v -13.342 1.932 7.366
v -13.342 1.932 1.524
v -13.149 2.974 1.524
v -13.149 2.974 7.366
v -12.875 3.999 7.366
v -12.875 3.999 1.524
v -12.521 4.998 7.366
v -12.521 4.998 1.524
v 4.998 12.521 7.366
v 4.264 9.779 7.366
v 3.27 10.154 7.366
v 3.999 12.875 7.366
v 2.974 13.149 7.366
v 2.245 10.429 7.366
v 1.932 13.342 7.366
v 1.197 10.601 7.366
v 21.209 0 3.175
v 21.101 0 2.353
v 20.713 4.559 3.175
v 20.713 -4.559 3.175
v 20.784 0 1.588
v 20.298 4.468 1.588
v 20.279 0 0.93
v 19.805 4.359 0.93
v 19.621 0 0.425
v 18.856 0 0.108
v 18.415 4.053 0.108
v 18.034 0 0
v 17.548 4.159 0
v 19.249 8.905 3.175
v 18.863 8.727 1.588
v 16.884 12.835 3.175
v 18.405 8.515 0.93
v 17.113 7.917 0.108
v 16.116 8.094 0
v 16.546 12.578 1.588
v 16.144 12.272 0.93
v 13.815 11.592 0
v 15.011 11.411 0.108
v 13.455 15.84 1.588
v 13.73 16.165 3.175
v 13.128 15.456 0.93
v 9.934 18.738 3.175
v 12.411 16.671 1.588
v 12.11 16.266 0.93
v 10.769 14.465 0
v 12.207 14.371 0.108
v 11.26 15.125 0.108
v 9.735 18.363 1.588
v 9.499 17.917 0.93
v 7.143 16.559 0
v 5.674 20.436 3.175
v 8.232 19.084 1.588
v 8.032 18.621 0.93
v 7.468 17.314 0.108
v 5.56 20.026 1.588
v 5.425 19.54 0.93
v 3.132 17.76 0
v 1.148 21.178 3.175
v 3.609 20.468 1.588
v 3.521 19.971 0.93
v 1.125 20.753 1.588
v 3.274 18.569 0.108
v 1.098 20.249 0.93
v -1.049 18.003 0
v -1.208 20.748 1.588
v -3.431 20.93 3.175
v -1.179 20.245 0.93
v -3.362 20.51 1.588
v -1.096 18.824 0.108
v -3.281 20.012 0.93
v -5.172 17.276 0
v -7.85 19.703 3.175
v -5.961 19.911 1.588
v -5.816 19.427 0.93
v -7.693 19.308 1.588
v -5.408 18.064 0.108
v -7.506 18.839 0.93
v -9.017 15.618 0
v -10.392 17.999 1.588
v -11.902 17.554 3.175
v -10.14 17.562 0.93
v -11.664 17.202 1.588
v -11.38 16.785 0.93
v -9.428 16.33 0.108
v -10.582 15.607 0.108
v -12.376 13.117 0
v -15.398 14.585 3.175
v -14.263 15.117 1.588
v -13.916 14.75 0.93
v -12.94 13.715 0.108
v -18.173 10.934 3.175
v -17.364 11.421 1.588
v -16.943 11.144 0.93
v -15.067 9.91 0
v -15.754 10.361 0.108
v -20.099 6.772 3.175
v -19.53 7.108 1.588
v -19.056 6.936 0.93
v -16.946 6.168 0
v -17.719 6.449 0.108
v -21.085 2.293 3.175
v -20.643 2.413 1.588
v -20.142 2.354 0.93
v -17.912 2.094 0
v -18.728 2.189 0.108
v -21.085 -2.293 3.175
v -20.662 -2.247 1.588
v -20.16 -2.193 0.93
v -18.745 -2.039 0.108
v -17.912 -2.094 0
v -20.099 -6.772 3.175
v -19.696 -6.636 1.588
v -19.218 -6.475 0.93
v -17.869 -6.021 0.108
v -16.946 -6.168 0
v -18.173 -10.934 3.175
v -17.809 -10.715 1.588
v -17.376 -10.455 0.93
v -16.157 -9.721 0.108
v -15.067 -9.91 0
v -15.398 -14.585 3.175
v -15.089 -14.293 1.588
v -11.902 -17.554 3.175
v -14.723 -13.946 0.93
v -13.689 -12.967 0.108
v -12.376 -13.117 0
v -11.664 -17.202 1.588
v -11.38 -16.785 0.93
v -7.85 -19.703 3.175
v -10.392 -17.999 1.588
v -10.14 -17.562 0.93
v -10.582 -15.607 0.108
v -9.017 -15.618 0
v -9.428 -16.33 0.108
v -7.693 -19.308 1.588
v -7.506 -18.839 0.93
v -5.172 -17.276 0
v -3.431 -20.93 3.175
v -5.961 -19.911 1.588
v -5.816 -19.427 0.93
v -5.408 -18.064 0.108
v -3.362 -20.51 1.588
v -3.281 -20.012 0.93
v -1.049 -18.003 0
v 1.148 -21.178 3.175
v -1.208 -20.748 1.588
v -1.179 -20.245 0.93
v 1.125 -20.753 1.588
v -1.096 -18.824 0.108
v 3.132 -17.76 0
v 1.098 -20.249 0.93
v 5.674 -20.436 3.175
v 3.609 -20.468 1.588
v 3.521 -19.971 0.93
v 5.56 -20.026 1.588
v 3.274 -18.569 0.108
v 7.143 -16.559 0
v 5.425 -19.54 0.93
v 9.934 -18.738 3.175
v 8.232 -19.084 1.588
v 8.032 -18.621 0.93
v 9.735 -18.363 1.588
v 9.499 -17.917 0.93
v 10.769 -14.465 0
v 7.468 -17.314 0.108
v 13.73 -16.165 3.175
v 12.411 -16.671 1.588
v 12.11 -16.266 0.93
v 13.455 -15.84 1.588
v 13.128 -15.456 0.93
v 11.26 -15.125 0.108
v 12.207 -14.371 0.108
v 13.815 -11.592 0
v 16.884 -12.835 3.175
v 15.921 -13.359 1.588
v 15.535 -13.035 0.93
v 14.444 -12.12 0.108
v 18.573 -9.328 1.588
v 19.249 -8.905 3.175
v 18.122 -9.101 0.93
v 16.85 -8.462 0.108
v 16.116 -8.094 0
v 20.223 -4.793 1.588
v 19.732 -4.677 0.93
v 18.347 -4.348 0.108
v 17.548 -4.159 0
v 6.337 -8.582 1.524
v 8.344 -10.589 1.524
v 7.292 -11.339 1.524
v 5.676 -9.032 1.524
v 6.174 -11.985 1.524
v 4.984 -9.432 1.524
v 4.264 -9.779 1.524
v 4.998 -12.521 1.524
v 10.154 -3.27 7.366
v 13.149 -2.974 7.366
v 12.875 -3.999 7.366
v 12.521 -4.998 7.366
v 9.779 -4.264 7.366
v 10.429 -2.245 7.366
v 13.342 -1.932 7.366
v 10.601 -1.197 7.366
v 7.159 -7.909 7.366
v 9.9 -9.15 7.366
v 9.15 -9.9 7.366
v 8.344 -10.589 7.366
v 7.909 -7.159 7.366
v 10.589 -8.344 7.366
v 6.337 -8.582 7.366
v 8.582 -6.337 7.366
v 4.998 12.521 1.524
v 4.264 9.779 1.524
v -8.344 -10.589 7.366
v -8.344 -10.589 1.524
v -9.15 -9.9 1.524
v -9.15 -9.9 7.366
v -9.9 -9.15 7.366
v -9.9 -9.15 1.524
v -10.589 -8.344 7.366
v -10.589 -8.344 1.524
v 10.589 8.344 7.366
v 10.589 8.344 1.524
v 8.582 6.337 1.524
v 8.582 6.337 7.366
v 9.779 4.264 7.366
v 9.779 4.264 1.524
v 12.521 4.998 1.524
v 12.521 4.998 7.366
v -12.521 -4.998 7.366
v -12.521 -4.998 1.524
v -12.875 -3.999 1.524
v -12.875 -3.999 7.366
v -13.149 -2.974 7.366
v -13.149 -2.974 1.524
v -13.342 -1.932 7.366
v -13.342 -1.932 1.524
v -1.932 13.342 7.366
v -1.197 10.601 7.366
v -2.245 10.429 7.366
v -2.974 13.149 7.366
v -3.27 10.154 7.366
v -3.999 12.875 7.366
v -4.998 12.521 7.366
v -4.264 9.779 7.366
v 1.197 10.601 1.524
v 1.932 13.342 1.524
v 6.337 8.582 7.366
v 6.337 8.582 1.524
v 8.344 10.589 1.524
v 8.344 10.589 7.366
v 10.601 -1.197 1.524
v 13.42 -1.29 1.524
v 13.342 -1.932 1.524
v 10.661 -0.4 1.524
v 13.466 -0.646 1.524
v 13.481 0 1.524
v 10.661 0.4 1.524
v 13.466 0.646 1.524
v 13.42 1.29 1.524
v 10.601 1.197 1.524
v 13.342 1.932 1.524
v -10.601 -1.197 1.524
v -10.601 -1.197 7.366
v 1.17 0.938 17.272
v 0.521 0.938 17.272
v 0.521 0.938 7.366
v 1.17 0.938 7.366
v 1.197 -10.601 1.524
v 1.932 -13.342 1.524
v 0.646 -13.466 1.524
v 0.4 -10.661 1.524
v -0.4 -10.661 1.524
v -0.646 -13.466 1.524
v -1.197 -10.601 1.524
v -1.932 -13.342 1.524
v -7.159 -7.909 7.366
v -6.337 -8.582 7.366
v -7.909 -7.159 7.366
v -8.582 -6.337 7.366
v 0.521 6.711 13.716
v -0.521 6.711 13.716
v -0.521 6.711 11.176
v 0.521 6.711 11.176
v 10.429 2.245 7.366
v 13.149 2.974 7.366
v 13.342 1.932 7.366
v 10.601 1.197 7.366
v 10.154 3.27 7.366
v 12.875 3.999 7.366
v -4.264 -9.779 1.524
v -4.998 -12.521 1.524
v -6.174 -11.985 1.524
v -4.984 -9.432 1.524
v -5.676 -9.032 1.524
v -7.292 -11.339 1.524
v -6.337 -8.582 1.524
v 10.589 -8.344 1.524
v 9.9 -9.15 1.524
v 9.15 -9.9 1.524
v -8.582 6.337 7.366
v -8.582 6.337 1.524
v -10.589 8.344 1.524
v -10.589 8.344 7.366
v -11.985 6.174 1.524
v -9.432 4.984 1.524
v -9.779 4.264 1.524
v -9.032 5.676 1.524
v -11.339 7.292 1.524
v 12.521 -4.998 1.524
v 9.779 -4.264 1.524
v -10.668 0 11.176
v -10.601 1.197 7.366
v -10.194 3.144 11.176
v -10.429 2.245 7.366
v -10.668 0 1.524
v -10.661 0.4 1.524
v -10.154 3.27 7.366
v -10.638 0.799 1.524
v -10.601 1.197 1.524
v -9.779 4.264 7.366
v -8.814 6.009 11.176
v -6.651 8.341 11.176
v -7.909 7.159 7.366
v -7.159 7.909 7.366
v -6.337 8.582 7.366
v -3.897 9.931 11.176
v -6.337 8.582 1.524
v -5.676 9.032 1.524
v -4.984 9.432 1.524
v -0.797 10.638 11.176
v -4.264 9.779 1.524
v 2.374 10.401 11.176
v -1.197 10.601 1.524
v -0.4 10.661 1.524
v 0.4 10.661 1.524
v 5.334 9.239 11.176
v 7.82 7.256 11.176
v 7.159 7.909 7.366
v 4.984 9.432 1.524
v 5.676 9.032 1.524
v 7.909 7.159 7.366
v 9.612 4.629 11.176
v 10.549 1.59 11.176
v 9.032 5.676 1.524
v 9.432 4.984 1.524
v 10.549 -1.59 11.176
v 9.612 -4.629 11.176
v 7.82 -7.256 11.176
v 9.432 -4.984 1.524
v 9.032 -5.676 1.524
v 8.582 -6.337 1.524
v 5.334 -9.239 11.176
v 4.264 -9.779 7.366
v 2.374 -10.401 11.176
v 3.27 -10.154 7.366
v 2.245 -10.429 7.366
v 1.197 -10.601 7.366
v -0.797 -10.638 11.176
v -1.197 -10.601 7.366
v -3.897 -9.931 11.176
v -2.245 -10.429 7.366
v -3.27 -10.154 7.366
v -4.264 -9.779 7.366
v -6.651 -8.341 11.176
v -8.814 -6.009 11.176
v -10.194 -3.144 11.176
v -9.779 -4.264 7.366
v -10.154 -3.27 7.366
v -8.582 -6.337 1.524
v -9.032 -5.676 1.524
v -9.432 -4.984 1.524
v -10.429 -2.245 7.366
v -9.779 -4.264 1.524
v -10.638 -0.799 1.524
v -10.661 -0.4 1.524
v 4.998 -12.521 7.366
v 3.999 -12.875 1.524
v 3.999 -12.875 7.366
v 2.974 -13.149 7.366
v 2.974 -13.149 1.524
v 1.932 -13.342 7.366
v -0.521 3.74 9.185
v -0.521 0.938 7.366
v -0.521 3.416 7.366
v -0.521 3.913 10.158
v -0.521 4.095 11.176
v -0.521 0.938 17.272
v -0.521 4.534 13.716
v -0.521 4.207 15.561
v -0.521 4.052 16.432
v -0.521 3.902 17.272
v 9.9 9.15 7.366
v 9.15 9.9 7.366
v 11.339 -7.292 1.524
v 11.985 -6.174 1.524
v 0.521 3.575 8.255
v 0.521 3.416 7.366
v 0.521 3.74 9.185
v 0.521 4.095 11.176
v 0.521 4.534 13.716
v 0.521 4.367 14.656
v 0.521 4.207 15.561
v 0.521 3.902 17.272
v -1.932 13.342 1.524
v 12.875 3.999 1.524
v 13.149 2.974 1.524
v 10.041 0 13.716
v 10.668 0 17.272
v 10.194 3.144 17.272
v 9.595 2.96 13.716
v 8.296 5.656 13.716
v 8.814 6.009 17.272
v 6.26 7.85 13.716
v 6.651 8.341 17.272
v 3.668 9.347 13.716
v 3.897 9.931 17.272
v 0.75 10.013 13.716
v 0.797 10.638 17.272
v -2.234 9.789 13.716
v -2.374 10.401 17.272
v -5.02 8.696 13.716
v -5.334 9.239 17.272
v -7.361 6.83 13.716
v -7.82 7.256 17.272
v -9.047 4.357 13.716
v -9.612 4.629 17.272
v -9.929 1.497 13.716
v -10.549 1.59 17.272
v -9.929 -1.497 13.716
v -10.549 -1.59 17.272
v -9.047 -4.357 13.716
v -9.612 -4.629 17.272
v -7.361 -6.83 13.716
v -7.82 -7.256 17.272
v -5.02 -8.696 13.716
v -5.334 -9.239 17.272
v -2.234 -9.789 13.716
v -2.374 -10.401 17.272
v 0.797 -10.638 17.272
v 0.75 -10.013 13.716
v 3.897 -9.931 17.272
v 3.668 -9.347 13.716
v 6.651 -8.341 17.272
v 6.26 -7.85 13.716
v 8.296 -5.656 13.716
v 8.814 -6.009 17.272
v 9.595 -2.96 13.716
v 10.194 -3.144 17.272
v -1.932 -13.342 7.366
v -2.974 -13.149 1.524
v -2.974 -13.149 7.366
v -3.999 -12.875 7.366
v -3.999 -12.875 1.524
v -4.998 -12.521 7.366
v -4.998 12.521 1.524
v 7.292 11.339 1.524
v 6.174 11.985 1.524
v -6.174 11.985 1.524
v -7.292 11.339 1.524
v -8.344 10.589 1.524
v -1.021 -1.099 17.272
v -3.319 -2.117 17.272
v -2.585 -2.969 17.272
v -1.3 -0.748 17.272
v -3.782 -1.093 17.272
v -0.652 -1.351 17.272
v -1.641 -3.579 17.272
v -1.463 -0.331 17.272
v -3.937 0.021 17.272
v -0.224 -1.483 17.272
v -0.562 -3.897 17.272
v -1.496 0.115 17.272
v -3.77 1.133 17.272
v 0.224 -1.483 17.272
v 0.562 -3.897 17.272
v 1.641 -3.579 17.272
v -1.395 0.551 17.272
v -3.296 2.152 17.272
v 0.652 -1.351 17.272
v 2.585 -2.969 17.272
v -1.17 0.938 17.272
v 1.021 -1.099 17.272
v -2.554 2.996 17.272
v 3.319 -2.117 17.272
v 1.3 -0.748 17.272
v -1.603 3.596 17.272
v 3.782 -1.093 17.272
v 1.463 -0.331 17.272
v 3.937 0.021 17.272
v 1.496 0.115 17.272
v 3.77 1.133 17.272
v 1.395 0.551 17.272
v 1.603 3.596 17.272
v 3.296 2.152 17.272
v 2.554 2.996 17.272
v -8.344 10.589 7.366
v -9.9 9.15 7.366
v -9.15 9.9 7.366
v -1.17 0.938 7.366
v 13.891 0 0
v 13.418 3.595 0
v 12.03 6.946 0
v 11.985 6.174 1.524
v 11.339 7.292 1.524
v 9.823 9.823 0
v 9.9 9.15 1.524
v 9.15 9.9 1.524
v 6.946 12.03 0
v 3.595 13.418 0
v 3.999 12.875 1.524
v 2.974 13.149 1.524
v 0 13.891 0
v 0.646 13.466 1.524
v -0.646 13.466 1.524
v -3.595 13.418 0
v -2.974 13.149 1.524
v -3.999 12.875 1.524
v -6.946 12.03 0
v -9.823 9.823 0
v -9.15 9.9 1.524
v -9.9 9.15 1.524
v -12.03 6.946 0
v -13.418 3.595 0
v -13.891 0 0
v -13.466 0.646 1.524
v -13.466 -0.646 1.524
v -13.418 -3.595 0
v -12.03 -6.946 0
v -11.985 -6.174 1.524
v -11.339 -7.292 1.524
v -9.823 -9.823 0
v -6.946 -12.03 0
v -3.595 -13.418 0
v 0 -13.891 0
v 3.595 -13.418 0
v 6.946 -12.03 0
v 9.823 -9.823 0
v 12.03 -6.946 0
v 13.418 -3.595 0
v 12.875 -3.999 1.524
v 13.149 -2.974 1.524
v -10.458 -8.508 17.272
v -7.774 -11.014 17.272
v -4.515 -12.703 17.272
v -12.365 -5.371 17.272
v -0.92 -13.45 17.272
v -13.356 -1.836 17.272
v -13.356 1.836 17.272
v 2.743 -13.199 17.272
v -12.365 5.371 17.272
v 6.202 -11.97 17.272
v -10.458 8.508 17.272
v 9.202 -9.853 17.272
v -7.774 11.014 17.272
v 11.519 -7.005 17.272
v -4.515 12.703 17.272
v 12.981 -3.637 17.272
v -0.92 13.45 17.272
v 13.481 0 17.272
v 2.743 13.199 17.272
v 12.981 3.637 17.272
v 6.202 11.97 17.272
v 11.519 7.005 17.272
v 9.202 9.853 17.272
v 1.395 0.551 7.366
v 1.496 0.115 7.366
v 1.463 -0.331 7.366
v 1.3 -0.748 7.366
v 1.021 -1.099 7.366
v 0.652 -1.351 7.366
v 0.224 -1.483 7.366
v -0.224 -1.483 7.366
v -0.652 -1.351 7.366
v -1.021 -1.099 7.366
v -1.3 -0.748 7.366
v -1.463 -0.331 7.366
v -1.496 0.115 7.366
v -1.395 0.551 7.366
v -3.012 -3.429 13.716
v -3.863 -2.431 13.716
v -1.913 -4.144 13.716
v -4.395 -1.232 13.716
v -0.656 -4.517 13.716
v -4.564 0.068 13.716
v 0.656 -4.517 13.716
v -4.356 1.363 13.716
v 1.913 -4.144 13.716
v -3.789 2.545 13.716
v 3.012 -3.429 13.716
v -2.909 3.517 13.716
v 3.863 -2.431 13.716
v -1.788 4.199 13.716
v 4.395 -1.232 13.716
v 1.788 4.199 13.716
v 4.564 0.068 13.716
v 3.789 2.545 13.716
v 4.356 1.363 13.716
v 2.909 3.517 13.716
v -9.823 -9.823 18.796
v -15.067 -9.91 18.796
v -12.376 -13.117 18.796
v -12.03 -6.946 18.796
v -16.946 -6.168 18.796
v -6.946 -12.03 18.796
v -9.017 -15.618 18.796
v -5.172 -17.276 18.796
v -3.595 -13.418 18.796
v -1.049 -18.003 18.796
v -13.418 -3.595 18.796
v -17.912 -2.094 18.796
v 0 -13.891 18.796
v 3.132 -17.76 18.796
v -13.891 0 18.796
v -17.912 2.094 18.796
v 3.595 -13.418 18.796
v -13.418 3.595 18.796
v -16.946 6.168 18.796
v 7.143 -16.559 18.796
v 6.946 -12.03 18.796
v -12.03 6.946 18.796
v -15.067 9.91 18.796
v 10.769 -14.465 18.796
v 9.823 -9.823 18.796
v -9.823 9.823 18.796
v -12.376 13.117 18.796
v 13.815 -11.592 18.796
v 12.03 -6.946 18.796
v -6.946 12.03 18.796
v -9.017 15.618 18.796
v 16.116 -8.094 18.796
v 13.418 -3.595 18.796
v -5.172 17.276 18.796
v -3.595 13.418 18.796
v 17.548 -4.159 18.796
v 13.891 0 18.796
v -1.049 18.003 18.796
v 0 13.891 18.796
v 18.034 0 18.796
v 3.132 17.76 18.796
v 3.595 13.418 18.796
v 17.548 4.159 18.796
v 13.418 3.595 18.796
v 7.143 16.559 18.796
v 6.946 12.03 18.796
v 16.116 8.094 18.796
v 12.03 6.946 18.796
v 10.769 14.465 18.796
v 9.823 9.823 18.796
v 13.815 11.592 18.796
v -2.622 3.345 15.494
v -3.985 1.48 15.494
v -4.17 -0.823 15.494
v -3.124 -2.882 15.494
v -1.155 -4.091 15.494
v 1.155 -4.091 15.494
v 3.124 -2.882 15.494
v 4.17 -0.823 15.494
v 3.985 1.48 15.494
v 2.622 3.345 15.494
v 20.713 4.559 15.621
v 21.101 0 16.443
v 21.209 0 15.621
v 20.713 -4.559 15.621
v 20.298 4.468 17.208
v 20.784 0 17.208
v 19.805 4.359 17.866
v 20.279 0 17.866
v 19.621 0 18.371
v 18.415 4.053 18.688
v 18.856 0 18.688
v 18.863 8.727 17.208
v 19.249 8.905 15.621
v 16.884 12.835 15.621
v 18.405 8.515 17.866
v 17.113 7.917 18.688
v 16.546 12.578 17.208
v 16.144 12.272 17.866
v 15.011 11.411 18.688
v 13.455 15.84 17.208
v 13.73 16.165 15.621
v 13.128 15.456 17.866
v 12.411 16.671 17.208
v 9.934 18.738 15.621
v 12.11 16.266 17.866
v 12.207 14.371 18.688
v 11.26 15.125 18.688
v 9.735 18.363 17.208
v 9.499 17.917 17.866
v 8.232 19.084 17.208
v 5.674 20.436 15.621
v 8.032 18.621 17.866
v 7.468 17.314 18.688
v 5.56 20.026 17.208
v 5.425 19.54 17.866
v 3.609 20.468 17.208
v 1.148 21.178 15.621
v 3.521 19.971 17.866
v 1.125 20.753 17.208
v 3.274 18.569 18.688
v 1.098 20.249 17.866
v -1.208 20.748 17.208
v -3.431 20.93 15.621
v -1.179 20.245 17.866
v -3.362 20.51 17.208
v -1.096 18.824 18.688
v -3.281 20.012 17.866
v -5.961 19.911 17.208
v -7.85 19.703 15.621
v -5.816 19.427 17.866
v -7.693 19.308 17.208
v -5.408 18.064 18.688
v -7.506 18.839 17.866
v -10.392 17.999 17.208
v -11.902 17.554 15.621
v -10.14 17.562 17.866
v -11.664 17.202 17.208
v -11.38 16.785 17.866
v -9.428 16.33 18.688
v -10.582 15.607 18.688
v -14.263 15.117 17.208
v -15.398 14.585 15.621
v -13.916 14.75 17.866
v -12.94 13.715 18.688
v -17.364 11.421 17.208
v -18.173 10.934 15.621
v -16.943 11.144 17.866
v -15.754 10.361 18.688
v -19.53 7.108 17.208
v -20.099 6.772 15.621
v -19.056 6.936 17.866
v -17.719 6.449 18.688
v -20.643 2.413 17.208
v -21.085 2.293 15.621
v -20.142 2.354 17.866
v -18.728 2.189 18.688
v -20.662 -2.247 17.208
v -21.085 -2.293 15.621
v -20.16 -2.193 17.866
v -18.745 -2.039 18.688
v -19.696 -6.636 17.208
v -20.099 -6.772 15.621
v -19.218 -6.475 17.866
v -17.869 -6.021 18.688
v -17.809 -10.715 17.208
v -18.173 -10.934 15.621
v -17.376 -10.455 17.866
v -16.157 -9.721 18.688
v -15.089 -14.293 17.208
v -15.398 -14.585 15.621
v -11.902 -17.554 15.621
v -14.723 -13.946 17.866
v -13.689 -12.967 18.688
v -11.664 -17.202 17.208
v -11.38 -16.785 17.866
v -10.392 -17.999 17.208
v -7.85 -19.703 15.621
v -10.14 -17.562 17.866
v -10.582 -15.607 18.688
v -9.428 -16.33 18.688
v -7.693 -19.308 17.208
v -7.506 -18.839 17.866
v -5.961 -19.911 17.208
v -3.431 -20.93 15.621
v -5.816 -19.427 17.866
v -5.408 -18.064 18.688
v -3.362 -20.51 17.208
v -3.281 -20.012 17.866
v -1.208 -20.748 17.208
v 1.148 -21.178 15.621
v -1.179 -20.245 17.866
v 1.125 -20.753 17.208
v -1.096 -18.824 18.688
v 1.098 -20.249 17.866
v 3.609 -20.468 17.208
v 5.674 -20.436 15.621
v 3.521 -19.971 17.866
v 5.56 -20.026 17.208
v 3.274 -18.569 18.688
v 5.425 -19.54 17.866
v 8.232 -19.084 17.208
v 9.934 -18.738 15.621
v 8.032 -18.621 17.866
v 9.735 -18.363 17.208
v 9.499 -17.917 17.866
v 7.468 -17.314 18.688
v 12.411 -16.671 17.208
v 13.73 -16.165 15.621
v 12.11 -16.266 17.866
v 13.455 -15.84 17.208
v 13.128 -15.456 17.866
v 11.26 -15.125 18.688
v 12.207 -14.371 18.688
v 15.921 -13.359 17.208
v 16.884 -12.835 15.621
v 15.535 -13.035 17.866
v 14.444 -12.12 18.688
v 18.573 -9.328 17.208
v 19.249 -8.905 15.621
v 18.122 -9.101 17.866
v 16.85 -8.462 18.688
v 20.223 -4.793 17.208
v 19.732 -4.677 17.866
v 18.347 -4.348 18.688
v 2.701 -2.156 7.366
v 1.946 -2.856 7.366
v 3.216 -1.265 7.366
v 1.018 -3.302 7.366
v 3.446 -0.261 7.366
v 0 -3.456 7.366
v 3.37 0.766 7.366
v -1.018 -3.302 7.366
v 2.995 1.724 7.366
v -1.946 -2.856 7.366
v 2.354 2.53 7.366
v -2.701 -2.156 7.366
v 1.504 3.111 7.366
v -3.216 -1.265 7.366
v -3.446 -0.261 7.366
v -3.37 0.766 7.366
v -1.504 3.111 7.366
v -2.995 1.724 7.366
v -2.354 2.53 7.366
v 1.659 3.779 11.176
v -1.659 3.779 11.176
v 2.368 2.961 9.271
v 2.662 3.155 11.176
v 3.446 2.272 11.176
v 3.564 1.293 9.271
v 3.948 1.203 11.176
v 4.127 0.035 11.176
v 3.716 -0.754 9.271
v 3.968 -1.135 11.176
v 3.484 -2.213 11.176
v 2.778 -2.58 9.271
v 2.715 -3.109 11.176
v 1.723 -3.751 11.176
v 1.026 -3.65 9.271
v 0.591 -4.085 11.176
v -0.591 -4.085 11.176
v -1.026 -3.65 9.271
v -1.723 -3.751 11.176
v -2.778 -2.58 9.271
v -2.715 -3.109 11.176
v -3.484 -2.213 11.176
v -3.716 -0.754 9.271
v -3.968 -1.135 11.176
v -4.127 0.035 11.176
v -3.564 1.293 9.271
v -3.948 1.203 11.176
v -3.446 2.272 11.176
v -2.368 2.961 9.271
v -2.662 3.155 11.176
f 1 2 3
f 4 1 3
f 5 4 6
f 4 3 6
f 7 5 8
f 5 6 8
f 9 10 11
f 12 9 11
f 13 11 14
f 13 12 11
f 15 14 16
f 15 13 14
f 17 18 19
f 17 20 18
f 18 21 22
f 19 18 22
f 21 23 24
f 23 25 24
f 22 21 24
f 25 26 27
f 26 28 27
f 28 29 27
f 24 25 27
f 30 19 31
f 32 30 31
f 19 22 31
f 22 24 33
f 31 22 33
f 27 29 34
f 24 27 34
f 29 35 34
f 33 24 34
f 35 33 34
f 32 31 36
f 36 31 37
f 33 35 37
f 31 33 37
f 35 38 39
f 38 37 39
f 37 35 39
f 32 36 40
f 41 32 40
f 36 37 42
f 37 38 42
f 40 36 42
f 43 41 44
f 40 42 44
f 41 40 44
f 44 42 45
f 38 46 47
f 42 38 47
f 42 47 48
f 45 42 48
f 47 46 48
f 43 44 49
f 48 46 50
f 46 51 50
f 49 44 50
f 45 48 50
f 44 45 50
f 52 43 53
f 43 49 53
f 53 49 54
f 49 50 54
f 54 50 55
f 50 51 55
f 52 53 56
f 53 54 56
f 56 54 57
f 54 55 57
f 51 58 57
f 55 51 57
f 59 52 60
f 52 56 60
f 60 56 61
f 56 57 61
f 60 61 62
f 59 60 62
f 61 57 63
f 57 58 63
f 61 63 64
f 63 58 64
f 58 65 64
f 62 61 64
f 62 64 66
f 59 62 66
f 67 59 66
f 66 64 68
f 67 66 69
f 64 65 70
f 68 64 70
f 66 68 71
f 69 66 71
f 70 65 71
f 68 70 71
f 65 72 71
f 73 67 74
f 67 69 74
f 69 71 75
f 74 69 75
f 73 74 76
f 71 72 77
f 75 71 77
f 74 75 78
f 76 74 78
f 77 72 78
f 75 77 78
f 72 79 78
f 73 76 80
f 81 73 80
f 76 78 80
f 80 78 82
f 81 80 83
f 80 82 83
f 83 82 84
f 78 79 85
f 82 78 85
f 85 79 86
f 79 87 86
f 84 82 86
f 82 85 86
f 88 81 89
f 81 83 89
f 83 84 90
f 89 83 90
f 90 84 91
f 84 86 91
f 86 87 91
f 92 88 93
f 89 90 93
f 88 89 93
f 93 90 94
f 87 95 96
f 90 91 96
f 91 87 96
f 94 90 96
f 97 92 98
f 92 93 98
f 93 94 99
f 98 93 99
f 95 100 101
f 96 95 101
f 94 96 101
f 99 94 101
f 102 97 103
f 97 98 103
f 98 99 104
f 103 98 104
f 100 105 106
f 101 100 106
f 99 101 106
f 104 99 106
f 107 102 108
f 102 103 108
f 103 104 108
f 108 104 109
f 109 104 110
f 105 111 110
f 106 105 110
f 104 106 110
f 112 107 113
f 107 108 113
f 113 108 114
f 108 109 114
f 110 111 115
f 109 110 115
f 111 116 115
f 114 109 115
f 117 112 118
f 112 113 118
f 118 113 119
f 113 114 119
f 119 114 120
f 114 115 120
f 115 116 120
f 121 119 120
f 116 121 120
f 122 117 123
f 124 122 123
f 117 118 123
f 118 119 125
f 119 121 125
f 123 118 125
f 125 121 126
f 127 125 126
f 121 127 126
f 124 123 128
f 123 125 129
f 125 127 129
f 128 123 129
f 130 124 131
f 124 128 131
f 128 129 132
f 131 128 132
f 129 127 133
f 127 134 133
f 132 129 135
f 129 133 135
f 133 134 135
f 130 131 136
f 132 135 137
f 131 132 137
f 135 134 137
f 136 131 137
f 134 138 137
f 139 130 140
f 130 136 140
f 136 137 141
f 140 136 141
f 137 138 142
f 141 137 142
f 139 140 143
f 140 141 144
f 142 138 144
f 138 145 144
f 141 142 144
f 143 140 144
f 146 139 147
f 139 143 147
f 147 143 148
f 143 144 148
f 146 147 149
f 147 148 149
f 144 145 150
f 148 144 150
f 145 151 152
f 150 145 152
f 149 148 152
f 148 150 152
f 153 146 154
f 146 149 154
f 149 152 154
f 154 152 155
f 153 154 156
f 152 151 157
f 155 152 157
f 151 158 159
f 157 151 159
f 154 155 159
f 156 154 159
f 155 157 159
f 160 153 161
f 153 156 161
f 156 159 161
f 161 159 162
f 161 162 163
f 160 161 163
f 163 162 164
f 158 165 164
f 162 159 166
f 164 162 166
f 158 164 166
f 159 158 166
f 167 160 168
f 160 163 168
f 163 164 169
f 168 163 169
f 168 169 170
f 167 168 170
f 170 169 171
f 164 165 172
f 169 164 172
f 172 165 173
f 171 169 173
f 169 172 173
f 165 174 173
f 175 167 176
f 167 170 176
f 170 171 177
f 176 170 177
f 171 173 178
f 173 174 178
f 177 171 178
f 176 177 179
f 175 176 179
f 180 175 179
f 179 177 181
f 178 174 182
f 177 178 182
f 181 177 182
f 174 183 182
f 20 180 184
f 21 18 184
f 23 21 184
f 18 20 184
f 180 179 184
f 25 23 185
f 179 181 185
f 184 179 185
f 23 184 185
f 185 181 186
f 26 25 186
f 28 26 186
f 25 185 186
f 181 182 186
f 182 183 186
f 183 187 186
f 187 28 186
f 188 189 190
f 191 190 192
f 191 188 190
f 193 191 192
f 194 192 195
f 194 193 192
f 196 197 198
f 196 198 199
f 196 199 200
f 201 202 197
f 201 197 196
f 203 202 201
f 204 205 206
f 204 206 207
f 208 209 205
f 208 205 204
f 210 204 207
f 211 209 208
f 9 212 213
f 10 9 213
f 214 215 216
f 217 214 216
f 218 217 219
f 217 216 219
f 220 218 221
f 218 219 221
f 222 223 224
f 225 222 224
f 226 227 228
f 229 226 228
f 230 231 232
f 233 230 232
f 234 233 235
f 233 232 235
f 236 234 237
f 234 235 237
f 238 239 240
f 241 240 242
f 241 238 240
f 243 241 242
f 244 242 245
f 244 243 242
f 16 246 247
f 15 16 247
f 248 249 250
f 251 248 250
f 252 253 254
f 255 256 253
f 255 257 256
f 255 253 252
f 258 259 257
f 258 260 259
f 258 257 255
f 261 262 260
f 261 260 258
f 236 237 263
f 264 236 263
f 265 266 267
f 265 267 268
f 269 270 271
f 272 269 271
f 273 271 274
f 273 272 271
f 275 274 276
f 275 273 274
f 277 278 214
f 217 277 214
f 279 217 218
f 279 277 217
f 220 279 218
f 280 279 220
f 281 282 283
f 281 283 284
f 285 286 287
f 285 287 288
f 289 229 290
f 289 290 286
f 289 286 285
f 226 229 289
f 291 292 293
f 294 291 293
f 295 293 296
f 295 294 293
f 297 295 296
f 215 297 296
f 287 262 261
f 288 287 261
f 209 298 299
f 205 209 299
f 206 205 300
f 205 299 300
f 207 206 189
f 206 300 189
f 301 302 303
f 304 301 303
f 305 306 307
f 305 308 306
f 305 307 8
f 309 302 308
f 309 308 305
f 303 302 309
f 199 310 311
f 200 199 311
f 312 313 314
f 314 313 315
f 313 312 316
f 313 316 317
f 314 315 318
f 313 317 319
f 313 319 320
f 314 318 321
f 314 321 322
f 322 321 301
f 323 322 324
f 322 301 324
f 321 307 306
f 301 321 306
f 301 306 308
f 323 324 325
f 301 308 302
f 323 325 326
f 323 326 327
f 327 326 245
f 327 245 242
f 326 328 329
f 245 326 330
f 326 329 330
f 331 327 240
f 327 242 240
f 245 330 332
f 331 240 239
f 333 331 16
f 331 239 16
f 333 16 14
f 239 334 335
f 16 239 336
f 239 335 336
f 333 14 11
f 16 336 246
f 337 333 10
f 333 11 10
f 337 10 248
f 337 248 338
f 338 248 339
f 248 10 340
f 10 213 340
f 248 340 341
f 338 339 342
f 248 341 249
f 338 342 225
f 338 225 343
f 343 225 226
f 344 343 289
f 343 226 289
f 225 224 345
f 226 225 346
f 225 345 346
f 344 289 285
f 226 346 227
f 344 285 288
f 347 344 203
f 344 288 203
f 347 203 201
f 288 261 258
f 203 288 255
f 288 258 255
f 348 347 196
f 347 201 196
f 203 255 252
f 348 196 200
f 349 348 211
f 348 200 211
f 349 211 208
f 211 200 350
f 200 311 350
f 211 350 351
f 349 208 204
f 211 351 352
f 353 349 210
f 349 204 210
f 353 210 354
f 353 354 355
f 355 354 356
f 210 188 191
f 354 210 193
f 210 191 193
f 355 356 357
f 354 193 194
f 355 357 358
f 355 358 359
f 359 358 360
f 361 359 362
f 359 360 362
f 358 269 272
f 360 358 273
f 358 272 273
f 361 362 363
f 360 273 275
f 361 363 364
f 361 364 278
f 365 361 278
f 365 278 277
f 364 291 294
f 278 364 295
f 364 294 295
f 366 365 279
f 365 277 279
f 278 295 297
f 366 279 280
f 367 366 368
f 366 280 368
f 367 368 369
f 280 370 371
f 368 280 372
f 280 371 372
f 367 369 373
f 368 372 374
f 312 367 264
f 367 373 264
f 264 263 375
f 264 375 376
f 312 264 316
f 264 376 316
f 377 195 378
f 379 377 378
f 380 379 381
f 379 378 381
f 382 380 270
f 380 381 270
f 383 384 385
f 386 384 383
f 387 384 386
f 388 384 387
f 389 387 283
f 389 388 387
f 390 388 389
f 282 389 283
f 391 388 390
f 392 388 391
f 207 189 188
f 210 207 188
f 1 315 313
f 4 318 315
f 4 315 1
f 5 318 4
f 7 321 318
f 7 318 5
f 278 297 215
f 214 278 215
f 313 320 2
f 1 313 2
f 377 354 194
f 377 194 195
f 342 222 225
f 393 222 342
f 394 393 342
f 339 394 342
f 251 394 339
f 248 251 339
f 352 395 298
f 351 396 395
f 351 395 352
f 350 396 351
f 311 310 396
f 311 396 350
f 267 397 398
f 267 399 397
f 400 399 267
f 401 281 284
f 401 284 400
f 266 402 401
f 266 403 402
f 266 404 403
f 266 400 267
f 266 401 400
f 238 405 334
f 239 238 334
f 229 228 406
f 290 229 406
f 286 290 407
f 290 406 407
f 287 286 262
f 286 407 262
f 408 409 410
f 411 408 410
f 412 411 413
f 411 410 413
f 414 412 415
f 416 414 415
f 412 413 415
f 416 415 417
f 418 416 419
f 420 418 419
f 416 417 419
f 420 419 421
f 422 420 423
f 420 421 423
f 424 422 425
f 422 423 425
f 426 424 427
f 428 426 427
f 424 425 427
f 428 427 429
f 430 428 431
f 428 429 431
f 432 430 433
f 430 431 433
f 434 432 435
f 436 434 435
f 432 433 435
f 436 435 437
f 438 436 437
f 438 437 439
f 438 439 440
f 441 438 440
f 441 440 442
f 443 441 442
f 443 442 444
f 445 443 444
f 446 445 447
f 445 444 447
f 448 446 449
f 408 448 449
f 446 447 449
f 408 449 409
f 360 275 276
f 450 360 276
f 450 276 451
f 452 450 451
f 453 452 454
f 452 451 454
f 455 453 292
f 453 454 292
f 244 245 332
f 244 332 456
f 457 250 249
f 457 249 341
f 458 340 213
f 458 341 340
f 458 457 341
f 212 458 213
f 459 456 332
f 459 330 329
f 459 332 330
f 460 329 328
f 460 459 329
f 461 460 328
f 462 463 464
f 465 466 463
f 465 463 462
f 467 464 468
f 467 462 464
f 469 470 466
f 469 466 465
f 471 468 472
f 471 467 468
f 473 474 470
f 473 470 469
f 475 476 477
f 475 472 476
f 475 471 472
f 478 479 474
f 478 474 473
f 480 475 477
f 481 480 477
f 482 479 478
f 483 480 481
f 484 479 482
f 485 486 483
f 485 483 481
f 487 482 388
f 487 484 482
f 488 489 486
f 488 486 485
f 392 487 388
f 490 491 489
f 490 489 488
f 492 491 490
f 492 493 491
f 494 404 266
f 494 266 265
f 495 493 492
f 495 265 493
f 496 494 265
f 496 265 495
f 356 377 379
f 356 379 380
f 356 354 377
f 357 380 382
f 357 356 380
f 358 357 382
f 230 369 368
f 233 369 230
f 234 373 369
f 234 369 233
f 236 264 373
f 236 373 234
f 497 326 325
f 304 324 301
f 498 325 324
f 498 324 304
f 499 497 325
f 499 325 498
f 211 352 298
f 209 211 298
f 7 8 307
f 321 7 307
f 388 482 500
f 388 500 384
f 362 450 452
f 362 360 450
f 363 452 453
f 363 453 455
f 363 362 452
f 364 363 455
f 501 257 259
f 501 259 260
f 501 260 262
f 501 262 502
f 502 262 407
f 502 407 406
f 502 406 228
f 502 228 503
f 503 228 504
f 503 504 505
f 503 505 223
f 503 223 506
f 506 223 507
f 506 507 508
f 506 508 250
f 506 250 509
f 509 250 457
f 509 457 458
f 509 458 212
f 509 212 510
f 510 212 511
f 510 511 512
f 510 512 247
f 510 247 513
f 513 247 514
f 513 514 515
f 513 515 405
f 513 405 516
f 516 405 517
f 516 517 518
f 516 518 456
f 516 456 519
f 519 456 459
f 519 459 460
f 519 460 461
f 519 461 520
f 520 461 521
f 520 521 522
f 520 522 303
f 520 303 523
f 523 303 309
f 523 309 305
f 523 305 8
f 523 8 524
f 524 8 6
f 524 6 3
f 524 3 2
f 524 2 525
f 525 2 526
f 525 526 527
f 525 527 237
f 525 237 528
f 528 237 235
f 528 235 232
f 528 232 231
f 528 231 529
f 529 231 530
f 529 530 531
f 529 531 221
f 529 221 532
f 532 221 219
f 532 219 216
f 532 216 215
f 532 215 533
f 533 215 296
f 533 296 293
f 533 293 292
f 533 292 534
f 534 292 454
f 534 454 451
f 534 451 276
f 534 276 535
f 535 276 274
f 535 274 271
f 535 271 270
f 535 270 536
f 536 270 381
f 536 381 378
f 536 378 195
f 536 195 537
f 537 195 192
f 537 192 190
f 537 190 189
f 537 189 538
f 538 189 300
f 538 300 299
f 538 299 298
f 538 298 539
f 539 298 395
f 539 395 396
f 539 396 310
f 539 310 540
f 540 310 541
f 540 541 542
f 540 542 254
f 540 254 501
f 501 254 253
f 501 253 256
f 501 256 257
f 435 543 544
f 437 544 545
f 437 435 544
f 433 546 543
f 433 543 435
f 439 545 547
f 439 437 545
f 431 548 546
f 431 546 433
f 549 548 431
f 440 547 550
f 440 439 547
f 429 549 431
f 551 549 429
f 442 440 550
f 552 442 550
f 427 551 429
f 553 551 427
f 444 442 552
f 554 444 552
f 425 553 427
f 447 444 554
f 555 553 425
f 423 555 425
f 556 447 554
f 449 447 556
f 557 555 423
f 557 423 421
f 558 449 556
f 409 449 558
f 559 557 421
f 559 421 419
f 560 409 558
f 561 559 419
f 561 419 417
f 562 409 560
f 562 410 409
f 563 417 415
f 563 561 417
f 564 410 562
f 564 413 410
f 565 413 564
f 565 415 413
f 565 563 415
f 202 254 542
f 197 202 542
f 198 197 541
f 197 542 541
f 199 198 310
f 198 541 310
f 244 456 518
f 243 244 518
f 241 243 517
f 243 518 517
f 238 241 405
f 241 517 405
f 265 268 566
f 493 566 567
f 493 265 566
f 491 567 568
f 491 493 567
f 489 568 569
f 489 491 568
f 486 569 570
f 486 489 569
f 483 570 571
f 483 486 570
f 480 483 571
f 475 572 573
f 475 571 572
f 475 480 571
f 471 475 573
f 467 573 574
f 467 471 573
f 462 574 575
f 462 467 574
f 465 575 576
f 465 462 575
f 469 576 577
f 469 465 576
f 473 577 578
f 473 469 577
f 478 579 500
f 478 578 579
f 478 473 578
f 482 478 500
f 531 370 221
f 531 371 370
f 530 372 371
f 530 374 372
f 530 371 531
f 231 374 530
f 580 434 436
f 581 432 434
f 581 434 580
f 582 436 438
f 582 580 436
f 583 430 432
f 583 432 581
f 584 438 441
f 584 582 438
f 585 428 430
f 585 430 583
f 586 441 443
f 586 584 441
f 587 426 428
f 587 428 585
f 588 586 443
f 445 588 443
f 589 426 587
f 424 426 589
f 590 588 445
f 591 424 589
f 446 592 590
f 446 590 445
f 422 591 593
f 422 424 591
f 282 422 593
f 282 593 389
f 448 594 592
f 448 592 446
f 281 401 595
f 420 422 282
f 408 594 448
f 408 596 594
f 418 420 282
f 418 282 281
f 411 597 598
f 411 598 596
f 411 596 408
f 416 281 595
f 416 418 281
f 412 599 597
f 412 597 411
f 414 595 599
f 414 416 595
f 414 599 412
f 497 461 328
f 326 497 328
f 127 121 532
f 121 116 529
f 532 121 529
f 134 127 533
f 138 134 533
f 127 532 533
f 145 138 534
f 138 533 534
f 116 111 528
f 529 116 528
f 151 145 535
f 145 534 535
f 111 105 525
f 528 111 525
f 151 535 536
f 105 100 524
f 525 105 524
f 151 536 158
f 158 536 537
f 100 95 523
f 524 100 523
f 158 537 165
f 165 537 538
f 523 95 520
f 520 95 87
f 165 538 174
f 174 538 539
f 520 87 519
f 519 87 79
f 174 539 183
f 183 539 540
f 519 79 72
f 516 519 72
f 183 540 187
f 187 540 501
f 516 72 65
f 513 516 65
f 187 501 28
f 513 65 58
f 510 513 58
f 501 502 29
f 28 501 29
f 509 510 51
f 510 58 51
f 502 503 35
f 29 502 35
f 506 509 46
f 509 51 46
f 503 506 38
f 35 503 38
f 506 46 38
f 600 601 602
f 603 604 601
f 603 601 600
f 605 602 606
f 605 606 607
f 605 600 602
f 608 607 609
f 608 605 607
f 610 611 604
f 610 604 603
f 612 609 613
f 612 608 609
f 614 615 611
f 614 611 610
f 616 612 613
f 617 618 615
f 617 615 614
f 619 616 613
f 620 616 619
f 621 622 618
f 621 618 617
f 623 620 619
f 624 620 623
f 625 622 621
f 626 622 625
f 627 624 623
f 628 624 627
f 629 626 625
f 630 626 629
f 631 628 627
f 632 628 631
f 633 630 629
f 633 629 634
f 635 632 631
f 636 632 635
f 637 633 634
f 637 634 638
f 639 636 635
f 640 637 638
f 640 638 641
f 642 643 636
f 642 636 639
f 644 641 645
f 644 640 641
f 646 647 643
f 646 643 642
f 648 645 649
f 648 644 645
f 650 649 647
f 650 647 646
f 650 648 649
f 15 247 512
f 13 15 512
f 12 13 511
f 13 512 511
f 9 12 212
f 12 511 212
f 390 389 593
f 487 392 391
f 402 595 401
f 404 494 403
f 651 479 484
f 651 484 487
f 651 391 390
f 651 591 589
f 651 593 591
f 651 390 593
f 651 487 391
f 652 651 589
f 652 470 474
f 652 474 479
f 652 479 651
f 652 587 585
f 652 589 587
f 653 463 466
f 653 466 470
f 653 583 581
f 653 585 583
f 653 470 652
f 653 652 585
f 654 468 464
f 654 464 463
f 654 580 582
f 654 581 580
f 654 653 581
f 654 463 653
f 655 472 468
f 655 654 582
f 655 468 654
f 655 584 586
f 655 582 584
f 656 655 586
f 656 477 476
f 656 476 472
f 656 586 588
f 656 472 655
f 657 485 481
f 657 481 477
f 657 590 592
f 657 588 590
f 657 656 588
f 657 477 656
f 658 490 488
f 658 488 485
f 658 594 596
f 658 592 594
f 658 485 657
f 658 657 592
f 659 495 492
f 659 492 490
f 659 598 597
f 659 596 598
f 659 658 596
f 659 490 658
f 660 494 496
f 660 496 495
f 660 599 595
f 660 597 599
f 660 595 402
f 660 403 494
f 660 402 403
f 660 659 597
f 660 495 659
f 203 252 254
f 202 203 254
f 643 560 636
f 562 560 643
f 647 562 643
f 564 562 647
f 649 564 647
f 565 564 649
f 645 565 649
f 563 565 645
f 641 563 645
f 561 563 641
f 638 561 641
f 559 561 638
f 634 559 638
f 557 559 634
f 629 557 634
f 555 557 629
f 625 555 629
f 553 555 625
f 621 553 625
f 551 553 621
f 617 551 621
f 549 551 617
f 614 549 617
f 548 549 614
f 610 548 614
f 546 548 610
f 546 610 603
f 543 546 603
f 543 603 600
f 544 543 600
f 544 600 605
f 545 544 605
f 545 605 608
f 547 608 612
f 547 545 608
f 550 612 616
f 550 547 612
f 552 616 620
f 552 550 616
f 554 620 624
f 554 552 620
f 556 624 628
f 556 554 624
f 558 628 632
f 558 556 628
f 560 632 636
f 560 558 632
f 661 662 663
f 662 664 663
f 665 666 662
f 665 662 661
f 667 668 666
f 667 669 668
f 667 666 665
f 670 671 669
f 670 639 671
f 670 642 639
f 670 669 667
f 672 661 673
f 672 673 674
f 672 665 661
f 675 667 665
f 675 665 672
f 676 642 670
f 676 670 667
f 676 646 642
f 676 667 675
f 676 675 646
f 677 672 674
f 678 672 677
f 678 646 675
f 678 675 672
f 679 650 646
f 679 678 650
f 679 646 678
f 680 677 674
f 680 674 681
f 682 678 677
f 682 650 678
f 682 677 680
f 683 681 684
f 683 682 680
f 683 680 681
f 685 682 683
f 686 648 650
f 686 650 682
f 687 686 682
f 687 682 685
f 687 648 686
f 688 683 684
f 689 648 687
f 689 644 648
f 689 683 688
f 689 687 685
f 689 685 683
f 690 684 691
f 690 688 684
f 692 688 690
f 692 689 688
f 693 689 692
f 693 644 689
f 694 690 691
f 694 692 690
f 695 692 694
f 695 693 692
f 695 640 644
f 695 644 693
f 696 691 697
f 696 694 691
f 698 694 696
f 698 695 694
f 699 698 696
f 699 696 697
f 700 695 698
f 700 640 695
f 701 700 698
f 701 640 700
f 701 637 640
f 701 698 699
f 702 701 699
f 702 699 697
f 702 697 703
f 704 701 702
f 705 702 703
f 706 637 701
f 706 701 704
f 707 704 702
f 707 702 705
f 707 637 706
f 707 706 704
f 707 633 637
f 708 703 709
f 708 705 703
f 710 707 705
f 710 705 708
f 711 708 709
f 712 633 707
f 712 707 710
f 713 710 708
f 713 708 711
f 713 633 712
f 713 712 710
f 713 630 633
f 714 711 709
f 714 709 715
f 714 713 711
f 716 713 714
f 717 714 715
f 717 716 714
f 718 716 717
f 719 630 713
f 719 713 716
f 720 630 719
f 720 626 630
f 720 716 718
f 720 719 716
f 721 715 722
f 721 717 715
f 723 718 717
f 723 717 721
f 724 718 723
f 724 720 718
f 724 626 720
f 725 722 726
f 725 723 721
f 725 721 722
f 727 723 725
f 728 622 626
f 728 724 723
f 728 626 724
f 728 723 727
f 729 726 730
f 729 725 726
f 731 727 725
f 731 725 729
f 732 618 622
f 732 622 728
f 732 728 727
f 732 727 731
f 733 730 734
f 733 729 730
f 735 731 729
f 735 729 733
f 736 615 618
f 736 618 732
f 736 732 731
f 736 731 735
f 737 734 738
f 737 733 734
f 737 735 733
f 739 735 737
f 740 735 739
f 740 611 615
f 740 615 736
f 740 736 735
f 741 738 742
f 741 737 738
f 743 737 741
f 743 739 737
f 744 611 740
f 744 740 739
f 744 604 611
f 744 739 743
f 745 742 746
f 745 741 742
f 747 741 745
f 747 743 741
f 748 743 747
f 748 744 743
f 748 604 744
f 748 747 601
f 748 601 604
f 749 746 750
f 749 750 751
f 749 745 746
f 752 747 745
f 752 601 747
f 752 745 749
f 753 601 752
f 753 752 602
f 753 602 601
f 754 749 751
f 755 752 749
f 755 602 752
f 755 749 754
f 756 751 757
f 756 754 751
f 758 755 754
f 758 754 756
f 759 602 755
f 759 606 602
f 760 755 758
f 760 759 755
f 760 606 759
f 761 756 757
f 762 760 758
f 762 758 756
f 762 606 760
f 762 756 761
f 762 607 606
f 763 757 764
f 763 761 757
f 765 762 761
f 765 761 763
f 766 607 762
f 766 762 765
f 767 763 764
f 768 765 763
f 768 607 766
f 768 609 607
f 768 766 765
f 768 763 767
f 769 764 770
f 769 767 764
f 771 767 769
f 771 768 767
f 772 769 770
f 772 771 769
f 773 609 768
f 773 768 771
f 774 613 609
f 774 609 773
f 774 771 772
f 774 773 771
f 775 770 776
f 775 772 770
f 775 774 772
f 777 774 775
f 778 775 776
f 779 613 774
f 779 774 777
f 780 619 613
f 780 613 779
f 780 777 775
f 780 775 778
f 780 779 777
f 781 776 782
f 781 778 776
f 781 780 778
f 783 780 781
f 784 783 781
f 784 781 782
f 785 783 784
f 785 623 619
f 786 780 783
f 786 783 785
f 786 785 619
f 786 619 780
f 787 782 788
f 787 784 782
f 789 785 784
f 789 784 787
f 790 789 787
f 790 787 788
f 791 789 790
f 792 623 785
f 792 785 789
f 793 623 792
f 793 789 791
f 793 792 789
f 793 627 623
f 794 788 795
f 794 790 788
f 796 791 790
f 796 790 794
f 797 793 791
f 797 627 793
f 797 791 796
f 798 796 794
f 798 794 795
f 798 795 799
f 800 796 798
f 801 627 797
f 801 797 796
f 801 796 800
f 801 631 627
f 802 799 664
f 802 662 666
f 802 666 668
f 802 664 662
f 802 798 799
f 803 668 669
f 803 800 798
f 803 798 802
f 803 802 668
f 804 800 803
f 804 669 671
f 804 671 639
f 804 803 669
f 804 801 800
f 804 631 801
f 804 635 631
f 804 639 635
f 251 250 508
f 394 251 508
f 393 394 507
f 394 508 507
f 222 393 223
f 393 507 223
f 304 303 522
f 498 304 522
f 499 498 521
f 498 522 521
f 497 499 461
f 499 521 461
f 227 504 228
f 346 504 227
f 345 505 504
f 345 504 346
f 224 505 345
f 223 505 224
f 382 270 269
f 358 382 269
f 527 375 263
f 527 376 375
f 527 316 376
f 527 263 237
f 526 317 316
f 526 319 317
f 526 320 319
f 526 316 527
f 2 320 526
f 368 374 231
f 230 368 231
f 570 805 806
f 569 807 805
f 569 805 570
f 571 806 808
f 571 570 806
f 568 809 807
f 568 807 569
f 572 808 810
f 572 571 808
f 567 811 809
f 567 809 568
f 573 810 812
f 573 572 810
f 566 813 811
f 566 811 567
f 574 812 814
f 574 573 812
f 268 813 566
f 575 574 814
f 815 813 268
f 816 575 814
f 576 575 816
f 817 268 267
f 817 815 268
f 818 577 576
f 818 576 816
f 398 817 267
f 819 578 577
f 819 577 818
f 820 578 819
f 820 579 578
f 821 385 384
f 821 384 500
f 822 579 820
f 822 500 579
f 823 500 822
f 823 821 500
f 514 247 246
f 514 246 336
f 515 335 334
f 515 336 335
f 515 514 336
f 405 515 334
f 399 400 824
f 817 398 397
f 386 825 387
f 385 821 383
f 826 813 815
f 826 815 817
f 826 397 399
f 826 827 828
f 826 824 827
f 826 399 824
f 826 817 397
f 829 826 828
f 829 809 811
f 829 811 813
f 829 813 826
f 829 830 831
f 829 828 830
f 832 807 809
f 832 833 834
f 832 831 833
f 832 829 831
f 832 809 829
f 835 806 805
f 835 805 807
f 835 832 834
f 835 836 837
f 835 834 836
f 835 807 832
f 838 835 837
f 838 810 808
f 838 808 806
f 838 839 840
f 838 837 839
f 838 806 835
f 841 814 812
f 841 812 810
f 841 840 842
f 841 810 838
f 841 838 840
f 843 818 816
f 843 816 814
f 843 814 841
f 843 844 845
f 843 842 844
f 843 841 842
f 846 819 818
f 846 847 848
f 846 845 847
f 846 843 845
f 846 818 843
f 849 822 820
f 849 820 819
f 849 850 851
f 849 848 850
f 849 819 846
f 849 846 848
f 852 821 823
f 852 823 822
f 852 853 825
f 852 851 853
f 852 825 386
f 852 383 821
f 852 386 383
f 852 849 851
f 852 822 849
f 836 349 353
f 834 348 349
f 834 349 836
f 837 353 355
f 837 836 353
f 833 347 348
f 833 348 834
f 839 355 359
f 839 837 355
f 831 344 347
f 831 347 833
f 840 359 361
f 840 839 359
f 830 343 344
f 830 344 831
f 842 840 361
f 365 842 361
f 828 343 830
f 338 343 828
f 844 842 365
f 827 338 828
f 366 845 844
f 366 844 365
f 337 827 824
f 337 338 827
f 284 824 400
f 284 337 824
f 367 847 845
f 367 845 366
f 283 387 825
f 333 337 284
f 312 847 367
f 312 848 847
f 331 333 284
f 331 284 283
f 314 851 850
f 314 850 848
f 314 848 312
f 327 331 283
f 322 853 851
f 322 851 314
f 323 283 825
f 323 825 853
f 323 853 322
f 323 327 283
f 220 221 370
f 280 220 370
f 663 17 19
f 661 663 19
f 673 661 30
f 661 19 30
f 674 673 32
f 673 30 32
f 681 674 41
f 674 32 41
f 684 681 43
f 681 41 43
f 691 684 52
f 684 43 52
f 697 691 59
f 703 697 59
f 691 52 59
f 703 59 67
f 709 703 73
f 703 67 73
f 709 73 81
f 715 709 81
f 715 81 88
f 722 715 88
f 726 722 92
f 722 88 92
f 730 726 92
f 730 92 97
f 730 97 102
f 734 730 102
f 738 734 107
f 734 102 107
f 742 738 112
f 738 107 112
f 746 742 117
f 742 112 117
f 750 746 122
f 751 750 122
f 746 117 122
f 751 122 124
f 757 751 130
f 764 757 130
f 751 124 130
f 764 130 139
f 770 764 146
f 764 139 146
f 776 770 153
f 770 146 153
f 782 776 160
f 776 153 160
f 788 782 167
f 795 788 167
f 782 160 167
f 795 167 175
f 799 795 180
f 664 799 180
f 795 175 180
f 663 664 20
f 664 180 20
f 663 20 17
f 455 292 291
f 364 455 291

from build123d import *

# Parameters (mm, degrees)
SKETCH1_R           = 21.209
SKETCH1_R_2         = 13.208
BOSS_EXTRUDE1_DEPTH = 18.796
FILLET1_R           = 3.175
BOSS_EXTRUDE2_START = -1.524
SKETCH2_R           = 13.208
BOSS_EXTRUDE2_DEPTH = 15.748
SKETCH4_R           = 10.668
SKETCH4_R_2         = 3.937
CUT_EXTRUDE2_DEPTH  = 3.556
CUT_EXTRUDE2_DRAFT  = -10
SKETCH5_R           = 10.668
CUT_EXTRUDE3_DEPTH  = 9.652
SKETCH6_R           = 4.1275
BOSS_EXTRUDE3_DEPTH = 3.81
BOSS_EXTRUDE3_TAPER = 10
CUT_EXTRUDE1_DEPTH  = 20.32
CHAMFER2_SIZE       = 0.683442603
CHAMFER2_SIZE_2     = 2.54
CHAMFER3_SIZE       = 0.683442603
CHAMFER3_SIZE_2     = 2.54
CUT_EXTRUDE4_DEPTH  = 5.842


with BuildPart() as part:
    # Sketch1 → Boss-Extrude1 (new body)
    with BuildSketch(Plane.XY):
        Circle(SKETCH1_R)
        Circle(SKETCH1_R_2, mode=Mode.SUBTRACT)
    extrude(amount=BOSS_EXTRUDE1_DEPTH)

    # Fillet1
    fillet1_edges = [part.edges().sort_by_distance(p)[0] for p in [
        (-21.209, 0, 0),
        (-21.209, 0, 18.796),
    ]]
    fillet(fillet1_edges, radius=FILLET1_R)



with BuildPart() as body_2:
    # Sketch2 → Boss-Extrude2 (new body)
    with BuildSketch(Plane.XY.offset(18.796).offset(BOSS_EXTRUDE2_START)):
        Circle(SKETCH2_R)
    extrude(amount=-BOSS_EXTRUDE2_DEPTH)


with BuildPart() as cut_extrude2_tool:
    # Sketch4 → Cut-Extrude2 (with draft: the straight prism first)
    with BuildSketch(Plane.XY.offset(17.272)):
        Circle(SKETCH4_R)
        Circle(SKETCH4_R_2, mode=Mode.SUBTRACT)
    extrude(amount=-CUT_EXTRUDE2_DEPTH)
    # Cut-Extrude2: the draft: its side faces are tilted about the plane it starts from
    cut_extrude2_sides = [cut_extrude2_tool.faces().sort_by_distance(p)[0] for p in [
        (-10.668, 0, 15.494),
        (-3.937, 0, 15.494),
    ]]
    draft(cut_extrude2_sides, Plane.XY.offset(17.272), CUT_EXTRUDE2_DRAFT)


with BuildPart() as body_2_1:
    add(body_2.part)

    # Cut-Extrude2: cut by cut_extrude2_tool
    add(cut_extrude2_tool.part, mode=Mode.SUBTRACT)

    # Sketch5 → Cut-Extrude3 (cut)
    with BuildSketch(Plane(origin=(0, 0, 1.524), x_dir=(-1, 0, 0), z_dir=(0, 0, -1))):
        Circle(SKETCH5_R)
    extrude(amount=-CUT_EXTRUDE3_DEPTH, mode=Mode.SUBTRACT)


with BuildPart() as part_1:
    add(part.part)

    add(body_2_1.part)  # Boss-Extrude3 merges body 2
    # Sketch6 → Boss-Extrude3 (add)
    with BuildSketch(Plane(origin=(0, 0, 11.176), x_dir=(-1, 0, 0), z_dir=(0, 0, -1))):
        Circle(SKETCH6_R)
    extrude(amount=BOSS_EXTRUDE3_DEPTH, taper=BOSS_EXTRUDE3_TAPER)

    # Sketch3 → Cut-Extrude1 (cut)
    with BuildSketch(Plane.XY.offset(17.272)):
        with BuildLine():
            Line((-1.17021598, 0.9384), (-0.5207, 0.9384))
            Line((-0.5207, 0.9384), (-0.5207, 6.710804028))
            Line((-0.5207, 6.710804028), (0.5207, 6.710804028))
            Line((0.5207, 6.710804028), (0.5207, 0.9384))
            Line((0.5207, 0.9384), (1.17021598, 0.9384))
            ThreePointArc((1.17021598, 0.9384), (0, -1.5), (-1.17021598, 0.9384))
        make_face()
    extrude(amount=-CUT_EXTRUDE1_DEPTH, mode=Mode.SUBTRACT)

    # Chamfer2
    # the kernel refuses this chamfer: 2.54, 0.683442603 mm, written as the material it takes off along each edge
    with BuildSketch(Plane(origin=(0, 0, 18.796), x_dir=(1, 0, 0), z_dir=(0, -1, 0))) as chamfer2_piece_1_section:
        Polygon((13.208 + CHAMFER2_SIZE, 0), (13.208, -CHAMFER2_SIZE_2), (13.208, 0), align=None)
    chamfer2_piece_1 = revolve(axis=Axis((0, 0, 18.796), (0, 0, 1)), mode=Mode.PRIVATE)
    chamfer2_piece_1 = split(chamfer2_piece_1, bisect_by=Plane(origin=(-13.659448533, 0, 17.272), z_dir=(0, 0, 1)), keep=Keep.TOP, mode=Mode.PRIVATE)
    add(chamfer2_piece_1, mode=Mode.SUBTRACT)

    # Chamfer3
    # the kernel refuses this chamfer: 2.54, 0.683442603 mm, written as the material it takes off along each edge
    with BuildSketch(Plane(origin=(0, 0, 0), x_dir=(1, 0, 0), z_dir=(0, -1, 0))) as chamfer3_piece_1_section:
        Polygon((13.208 + CHAMFER3_SIZE, 0), (13.208, CHAMFER3_SIZE_2), (13.208, 0), align=None)
    chamfer3_piece_1 = revolve(axis=Axis((0, 0, 0), (0, 0, 1)), mode=Mode.PRIVATE)
    chamfer3_piece_1 = split(chamfer3_piece_1, bisect_by=Plane(origin=(-13.659448521, 0, 1.524), z_dir=(0, 0, -1)), keep=Keep.TOP, mode=Mode.PRIVATE)
    add(chamfer3_piece_1, mode=Mode.SUBTRACT)

    # Sketch8 → Cut-Extrude4 (cut)
    with BuildSketch(Plane(origin=(0, 0, 1.524), x_dir=(-1, 0, 0), z_dir=(0, 0, -1))):
        with BuildLine():
            Line((1.931554123, 13.34228712), (0.26745284, 7.131776584))
            Line((0.26745284, 7.131776584), (3.334267338, 6.310026116))
            Line((3.334267338, 6.310026116), (4.998368621, 12.520536652))
            ThreePointArc((4.998368621, 12.520536652), (3.489237132, 13.022010258), (1.931554123, 13.34228712))
        make_face()
        with BuildLine():
            Line((8.343918499, 10.588982529), (3.797509246, 6.042573276))
            Line((3.797509246, 6.042573276), (6.042573276, 3.797509246))
            Line((6.042573276, 3.797509246), (10.588982529, 8.343918499))
            ThreePointArc((10.588982529, 8.343918499), (9.532773125, 9.532773125), (8.343918499, 10.588982529))
        make_face()
        with BuildLine():
            Line((12.520536652, 4.998368621), (6.310026116, 3.334267338))
            Line((6.310026116, 3.334267338), (7.131776584, 0.26745284))
            Line((7.131776584, 0.26745284), (13.34228712, 1.931554123))
            ThreePointArc((13.34228712, 1.931554123), (13.022010258, 3.489237132), (12.520536652, 4.998368621))
        make_face()
        with BuildLine():
            Line((13.34228712, -1.931554123), (7.131776584, -0.26745284))
            Line((7.131776584, -0.26745284), (6.310026116, -3.334267338))
            Line((6.310026116, -3.334267338), (12.520536652, -4.998368621))
            ThreePointArc((12.520536652, -4.998368621), (13.022010258, -3.489237132), (13.34228712, -1.931554123))
        make_face()
        with BuildLine():
            Line((10.588982529, -8.343918499), (6.042573276, -3.797509246))
            Line((6.042573276, -3.797509246), (3.797509246, -6.042573276))
            Line((3.797509246, -6.042573276), (8.343918499, -10.588982529))
            ThreePointArc((8.343918499, -10.588982529), (9.532773125, -9.532773125), (10.588982529, -8.343918499))
        make_face()
        with BuildLine():
            Line((4.998368621, -12.520536652), (3.334267338, -6.310026116))
            Line((3.334267338, -6.310026116), (0.26745284, -7.131776584))
            Line((0.26745284, -7.131776584), (1.931554123, -13.34228712))
            ThreePointArc((1.931554123, -13.34228712), (3.489237132, -13.022010258), (4.998368621, -12.520536652))
        make_face()
        with BuildLine():
            Line((-1.931554123, -13.34228712), (-0.26745284, -7.131776584))
            Line((-0.26745284, -7.131776584), (-3.334267338, -6.310026116))
            Line((-3.334267338, -6.310026116), (-4.998368621, -12.520536652))
            ThreePointArc((-4.998368621, -12.520536652), (-3.489237132, -13.022010258), (-1.931554123, -13.34228712))
        make_face()
        with BuildLine():
            Line((-8.343918499, -10.588982529), (-3.797509246, -6.042573276))
            Line((-3.797509246, -6.042573276), (-6.042573276, -3.797509246))
            Line((-6.042573276, -3.797509246), (-10.588982529, -8.343918499))
            ThreePointArc((-10.588982529, -8.343918499), (-9.532773125, -9.532773125), (-8.343918499, -10.588982529))
        make_face()
        with BuildLine():
            Line((-12.520536652, -4.998368621), (-6.310026116, -3.334267338))
            Line((-6.310026116, -3.334267338), (-7.131776584, -0.26745284))
            Line((-7.131776584, -0.26745284), (-13.34228712, -1.931554123))
            ThreePointArc((-13.34228712, -1.931554123), (-13.022010258, -3.489237132), (-12.520536652, -4.998368621))
        make_face()
        with BuildLine():
            Line((-13.34228712, 1.931554123), (-7.131776584, 0.26745284))
            Line((-7.131776584, 0.26745284), (-6.310026116, 3.334267338))
            Line((-6.310026116, 3.334267338), (-12.520536652, 4.998368621))
            ThreePointArc((-12.520536652, 4.998368621), (-13.022010258, 3.489237132), (-13.34228712, 1.931554123))
        make_face()
        with BuildLine():
            Line((-10.588982529, 8.343918499), (-6.042573276, 3.797509246))
            Line((-6.042573276, 3.797509246), (-3.797509246, 6.042573276))
            Line((-3.797509246, 6.042573276), (-8.343918499, 10.588982529))
            ThreePointArc((-8.343918499, 10.588982529), (-9.532773125, 9.532773125), (-10.588982529, 8.343918499))
        make_face()
        with BuildLine():
            Line((-4.998368621, 12.520536652), (-3.334267338, 6.310026116))
            Line((-3.334267338, 6.310026116), (-0.26745284, 7.131776584))
            Line((-0.26745284, 7.131776584), (-1.931554123, 13.34228712))
            ThreePointArc((-1.931554123, 13.34228712), (-3.489237132, 13.022010258), (-4.998368621, 12.520536652))
        make_face()
    extrude(amount=-CUT_EXTRUDE4_DEPTH, mode=Mode.SUBTRACT)


solid = part_1.part
